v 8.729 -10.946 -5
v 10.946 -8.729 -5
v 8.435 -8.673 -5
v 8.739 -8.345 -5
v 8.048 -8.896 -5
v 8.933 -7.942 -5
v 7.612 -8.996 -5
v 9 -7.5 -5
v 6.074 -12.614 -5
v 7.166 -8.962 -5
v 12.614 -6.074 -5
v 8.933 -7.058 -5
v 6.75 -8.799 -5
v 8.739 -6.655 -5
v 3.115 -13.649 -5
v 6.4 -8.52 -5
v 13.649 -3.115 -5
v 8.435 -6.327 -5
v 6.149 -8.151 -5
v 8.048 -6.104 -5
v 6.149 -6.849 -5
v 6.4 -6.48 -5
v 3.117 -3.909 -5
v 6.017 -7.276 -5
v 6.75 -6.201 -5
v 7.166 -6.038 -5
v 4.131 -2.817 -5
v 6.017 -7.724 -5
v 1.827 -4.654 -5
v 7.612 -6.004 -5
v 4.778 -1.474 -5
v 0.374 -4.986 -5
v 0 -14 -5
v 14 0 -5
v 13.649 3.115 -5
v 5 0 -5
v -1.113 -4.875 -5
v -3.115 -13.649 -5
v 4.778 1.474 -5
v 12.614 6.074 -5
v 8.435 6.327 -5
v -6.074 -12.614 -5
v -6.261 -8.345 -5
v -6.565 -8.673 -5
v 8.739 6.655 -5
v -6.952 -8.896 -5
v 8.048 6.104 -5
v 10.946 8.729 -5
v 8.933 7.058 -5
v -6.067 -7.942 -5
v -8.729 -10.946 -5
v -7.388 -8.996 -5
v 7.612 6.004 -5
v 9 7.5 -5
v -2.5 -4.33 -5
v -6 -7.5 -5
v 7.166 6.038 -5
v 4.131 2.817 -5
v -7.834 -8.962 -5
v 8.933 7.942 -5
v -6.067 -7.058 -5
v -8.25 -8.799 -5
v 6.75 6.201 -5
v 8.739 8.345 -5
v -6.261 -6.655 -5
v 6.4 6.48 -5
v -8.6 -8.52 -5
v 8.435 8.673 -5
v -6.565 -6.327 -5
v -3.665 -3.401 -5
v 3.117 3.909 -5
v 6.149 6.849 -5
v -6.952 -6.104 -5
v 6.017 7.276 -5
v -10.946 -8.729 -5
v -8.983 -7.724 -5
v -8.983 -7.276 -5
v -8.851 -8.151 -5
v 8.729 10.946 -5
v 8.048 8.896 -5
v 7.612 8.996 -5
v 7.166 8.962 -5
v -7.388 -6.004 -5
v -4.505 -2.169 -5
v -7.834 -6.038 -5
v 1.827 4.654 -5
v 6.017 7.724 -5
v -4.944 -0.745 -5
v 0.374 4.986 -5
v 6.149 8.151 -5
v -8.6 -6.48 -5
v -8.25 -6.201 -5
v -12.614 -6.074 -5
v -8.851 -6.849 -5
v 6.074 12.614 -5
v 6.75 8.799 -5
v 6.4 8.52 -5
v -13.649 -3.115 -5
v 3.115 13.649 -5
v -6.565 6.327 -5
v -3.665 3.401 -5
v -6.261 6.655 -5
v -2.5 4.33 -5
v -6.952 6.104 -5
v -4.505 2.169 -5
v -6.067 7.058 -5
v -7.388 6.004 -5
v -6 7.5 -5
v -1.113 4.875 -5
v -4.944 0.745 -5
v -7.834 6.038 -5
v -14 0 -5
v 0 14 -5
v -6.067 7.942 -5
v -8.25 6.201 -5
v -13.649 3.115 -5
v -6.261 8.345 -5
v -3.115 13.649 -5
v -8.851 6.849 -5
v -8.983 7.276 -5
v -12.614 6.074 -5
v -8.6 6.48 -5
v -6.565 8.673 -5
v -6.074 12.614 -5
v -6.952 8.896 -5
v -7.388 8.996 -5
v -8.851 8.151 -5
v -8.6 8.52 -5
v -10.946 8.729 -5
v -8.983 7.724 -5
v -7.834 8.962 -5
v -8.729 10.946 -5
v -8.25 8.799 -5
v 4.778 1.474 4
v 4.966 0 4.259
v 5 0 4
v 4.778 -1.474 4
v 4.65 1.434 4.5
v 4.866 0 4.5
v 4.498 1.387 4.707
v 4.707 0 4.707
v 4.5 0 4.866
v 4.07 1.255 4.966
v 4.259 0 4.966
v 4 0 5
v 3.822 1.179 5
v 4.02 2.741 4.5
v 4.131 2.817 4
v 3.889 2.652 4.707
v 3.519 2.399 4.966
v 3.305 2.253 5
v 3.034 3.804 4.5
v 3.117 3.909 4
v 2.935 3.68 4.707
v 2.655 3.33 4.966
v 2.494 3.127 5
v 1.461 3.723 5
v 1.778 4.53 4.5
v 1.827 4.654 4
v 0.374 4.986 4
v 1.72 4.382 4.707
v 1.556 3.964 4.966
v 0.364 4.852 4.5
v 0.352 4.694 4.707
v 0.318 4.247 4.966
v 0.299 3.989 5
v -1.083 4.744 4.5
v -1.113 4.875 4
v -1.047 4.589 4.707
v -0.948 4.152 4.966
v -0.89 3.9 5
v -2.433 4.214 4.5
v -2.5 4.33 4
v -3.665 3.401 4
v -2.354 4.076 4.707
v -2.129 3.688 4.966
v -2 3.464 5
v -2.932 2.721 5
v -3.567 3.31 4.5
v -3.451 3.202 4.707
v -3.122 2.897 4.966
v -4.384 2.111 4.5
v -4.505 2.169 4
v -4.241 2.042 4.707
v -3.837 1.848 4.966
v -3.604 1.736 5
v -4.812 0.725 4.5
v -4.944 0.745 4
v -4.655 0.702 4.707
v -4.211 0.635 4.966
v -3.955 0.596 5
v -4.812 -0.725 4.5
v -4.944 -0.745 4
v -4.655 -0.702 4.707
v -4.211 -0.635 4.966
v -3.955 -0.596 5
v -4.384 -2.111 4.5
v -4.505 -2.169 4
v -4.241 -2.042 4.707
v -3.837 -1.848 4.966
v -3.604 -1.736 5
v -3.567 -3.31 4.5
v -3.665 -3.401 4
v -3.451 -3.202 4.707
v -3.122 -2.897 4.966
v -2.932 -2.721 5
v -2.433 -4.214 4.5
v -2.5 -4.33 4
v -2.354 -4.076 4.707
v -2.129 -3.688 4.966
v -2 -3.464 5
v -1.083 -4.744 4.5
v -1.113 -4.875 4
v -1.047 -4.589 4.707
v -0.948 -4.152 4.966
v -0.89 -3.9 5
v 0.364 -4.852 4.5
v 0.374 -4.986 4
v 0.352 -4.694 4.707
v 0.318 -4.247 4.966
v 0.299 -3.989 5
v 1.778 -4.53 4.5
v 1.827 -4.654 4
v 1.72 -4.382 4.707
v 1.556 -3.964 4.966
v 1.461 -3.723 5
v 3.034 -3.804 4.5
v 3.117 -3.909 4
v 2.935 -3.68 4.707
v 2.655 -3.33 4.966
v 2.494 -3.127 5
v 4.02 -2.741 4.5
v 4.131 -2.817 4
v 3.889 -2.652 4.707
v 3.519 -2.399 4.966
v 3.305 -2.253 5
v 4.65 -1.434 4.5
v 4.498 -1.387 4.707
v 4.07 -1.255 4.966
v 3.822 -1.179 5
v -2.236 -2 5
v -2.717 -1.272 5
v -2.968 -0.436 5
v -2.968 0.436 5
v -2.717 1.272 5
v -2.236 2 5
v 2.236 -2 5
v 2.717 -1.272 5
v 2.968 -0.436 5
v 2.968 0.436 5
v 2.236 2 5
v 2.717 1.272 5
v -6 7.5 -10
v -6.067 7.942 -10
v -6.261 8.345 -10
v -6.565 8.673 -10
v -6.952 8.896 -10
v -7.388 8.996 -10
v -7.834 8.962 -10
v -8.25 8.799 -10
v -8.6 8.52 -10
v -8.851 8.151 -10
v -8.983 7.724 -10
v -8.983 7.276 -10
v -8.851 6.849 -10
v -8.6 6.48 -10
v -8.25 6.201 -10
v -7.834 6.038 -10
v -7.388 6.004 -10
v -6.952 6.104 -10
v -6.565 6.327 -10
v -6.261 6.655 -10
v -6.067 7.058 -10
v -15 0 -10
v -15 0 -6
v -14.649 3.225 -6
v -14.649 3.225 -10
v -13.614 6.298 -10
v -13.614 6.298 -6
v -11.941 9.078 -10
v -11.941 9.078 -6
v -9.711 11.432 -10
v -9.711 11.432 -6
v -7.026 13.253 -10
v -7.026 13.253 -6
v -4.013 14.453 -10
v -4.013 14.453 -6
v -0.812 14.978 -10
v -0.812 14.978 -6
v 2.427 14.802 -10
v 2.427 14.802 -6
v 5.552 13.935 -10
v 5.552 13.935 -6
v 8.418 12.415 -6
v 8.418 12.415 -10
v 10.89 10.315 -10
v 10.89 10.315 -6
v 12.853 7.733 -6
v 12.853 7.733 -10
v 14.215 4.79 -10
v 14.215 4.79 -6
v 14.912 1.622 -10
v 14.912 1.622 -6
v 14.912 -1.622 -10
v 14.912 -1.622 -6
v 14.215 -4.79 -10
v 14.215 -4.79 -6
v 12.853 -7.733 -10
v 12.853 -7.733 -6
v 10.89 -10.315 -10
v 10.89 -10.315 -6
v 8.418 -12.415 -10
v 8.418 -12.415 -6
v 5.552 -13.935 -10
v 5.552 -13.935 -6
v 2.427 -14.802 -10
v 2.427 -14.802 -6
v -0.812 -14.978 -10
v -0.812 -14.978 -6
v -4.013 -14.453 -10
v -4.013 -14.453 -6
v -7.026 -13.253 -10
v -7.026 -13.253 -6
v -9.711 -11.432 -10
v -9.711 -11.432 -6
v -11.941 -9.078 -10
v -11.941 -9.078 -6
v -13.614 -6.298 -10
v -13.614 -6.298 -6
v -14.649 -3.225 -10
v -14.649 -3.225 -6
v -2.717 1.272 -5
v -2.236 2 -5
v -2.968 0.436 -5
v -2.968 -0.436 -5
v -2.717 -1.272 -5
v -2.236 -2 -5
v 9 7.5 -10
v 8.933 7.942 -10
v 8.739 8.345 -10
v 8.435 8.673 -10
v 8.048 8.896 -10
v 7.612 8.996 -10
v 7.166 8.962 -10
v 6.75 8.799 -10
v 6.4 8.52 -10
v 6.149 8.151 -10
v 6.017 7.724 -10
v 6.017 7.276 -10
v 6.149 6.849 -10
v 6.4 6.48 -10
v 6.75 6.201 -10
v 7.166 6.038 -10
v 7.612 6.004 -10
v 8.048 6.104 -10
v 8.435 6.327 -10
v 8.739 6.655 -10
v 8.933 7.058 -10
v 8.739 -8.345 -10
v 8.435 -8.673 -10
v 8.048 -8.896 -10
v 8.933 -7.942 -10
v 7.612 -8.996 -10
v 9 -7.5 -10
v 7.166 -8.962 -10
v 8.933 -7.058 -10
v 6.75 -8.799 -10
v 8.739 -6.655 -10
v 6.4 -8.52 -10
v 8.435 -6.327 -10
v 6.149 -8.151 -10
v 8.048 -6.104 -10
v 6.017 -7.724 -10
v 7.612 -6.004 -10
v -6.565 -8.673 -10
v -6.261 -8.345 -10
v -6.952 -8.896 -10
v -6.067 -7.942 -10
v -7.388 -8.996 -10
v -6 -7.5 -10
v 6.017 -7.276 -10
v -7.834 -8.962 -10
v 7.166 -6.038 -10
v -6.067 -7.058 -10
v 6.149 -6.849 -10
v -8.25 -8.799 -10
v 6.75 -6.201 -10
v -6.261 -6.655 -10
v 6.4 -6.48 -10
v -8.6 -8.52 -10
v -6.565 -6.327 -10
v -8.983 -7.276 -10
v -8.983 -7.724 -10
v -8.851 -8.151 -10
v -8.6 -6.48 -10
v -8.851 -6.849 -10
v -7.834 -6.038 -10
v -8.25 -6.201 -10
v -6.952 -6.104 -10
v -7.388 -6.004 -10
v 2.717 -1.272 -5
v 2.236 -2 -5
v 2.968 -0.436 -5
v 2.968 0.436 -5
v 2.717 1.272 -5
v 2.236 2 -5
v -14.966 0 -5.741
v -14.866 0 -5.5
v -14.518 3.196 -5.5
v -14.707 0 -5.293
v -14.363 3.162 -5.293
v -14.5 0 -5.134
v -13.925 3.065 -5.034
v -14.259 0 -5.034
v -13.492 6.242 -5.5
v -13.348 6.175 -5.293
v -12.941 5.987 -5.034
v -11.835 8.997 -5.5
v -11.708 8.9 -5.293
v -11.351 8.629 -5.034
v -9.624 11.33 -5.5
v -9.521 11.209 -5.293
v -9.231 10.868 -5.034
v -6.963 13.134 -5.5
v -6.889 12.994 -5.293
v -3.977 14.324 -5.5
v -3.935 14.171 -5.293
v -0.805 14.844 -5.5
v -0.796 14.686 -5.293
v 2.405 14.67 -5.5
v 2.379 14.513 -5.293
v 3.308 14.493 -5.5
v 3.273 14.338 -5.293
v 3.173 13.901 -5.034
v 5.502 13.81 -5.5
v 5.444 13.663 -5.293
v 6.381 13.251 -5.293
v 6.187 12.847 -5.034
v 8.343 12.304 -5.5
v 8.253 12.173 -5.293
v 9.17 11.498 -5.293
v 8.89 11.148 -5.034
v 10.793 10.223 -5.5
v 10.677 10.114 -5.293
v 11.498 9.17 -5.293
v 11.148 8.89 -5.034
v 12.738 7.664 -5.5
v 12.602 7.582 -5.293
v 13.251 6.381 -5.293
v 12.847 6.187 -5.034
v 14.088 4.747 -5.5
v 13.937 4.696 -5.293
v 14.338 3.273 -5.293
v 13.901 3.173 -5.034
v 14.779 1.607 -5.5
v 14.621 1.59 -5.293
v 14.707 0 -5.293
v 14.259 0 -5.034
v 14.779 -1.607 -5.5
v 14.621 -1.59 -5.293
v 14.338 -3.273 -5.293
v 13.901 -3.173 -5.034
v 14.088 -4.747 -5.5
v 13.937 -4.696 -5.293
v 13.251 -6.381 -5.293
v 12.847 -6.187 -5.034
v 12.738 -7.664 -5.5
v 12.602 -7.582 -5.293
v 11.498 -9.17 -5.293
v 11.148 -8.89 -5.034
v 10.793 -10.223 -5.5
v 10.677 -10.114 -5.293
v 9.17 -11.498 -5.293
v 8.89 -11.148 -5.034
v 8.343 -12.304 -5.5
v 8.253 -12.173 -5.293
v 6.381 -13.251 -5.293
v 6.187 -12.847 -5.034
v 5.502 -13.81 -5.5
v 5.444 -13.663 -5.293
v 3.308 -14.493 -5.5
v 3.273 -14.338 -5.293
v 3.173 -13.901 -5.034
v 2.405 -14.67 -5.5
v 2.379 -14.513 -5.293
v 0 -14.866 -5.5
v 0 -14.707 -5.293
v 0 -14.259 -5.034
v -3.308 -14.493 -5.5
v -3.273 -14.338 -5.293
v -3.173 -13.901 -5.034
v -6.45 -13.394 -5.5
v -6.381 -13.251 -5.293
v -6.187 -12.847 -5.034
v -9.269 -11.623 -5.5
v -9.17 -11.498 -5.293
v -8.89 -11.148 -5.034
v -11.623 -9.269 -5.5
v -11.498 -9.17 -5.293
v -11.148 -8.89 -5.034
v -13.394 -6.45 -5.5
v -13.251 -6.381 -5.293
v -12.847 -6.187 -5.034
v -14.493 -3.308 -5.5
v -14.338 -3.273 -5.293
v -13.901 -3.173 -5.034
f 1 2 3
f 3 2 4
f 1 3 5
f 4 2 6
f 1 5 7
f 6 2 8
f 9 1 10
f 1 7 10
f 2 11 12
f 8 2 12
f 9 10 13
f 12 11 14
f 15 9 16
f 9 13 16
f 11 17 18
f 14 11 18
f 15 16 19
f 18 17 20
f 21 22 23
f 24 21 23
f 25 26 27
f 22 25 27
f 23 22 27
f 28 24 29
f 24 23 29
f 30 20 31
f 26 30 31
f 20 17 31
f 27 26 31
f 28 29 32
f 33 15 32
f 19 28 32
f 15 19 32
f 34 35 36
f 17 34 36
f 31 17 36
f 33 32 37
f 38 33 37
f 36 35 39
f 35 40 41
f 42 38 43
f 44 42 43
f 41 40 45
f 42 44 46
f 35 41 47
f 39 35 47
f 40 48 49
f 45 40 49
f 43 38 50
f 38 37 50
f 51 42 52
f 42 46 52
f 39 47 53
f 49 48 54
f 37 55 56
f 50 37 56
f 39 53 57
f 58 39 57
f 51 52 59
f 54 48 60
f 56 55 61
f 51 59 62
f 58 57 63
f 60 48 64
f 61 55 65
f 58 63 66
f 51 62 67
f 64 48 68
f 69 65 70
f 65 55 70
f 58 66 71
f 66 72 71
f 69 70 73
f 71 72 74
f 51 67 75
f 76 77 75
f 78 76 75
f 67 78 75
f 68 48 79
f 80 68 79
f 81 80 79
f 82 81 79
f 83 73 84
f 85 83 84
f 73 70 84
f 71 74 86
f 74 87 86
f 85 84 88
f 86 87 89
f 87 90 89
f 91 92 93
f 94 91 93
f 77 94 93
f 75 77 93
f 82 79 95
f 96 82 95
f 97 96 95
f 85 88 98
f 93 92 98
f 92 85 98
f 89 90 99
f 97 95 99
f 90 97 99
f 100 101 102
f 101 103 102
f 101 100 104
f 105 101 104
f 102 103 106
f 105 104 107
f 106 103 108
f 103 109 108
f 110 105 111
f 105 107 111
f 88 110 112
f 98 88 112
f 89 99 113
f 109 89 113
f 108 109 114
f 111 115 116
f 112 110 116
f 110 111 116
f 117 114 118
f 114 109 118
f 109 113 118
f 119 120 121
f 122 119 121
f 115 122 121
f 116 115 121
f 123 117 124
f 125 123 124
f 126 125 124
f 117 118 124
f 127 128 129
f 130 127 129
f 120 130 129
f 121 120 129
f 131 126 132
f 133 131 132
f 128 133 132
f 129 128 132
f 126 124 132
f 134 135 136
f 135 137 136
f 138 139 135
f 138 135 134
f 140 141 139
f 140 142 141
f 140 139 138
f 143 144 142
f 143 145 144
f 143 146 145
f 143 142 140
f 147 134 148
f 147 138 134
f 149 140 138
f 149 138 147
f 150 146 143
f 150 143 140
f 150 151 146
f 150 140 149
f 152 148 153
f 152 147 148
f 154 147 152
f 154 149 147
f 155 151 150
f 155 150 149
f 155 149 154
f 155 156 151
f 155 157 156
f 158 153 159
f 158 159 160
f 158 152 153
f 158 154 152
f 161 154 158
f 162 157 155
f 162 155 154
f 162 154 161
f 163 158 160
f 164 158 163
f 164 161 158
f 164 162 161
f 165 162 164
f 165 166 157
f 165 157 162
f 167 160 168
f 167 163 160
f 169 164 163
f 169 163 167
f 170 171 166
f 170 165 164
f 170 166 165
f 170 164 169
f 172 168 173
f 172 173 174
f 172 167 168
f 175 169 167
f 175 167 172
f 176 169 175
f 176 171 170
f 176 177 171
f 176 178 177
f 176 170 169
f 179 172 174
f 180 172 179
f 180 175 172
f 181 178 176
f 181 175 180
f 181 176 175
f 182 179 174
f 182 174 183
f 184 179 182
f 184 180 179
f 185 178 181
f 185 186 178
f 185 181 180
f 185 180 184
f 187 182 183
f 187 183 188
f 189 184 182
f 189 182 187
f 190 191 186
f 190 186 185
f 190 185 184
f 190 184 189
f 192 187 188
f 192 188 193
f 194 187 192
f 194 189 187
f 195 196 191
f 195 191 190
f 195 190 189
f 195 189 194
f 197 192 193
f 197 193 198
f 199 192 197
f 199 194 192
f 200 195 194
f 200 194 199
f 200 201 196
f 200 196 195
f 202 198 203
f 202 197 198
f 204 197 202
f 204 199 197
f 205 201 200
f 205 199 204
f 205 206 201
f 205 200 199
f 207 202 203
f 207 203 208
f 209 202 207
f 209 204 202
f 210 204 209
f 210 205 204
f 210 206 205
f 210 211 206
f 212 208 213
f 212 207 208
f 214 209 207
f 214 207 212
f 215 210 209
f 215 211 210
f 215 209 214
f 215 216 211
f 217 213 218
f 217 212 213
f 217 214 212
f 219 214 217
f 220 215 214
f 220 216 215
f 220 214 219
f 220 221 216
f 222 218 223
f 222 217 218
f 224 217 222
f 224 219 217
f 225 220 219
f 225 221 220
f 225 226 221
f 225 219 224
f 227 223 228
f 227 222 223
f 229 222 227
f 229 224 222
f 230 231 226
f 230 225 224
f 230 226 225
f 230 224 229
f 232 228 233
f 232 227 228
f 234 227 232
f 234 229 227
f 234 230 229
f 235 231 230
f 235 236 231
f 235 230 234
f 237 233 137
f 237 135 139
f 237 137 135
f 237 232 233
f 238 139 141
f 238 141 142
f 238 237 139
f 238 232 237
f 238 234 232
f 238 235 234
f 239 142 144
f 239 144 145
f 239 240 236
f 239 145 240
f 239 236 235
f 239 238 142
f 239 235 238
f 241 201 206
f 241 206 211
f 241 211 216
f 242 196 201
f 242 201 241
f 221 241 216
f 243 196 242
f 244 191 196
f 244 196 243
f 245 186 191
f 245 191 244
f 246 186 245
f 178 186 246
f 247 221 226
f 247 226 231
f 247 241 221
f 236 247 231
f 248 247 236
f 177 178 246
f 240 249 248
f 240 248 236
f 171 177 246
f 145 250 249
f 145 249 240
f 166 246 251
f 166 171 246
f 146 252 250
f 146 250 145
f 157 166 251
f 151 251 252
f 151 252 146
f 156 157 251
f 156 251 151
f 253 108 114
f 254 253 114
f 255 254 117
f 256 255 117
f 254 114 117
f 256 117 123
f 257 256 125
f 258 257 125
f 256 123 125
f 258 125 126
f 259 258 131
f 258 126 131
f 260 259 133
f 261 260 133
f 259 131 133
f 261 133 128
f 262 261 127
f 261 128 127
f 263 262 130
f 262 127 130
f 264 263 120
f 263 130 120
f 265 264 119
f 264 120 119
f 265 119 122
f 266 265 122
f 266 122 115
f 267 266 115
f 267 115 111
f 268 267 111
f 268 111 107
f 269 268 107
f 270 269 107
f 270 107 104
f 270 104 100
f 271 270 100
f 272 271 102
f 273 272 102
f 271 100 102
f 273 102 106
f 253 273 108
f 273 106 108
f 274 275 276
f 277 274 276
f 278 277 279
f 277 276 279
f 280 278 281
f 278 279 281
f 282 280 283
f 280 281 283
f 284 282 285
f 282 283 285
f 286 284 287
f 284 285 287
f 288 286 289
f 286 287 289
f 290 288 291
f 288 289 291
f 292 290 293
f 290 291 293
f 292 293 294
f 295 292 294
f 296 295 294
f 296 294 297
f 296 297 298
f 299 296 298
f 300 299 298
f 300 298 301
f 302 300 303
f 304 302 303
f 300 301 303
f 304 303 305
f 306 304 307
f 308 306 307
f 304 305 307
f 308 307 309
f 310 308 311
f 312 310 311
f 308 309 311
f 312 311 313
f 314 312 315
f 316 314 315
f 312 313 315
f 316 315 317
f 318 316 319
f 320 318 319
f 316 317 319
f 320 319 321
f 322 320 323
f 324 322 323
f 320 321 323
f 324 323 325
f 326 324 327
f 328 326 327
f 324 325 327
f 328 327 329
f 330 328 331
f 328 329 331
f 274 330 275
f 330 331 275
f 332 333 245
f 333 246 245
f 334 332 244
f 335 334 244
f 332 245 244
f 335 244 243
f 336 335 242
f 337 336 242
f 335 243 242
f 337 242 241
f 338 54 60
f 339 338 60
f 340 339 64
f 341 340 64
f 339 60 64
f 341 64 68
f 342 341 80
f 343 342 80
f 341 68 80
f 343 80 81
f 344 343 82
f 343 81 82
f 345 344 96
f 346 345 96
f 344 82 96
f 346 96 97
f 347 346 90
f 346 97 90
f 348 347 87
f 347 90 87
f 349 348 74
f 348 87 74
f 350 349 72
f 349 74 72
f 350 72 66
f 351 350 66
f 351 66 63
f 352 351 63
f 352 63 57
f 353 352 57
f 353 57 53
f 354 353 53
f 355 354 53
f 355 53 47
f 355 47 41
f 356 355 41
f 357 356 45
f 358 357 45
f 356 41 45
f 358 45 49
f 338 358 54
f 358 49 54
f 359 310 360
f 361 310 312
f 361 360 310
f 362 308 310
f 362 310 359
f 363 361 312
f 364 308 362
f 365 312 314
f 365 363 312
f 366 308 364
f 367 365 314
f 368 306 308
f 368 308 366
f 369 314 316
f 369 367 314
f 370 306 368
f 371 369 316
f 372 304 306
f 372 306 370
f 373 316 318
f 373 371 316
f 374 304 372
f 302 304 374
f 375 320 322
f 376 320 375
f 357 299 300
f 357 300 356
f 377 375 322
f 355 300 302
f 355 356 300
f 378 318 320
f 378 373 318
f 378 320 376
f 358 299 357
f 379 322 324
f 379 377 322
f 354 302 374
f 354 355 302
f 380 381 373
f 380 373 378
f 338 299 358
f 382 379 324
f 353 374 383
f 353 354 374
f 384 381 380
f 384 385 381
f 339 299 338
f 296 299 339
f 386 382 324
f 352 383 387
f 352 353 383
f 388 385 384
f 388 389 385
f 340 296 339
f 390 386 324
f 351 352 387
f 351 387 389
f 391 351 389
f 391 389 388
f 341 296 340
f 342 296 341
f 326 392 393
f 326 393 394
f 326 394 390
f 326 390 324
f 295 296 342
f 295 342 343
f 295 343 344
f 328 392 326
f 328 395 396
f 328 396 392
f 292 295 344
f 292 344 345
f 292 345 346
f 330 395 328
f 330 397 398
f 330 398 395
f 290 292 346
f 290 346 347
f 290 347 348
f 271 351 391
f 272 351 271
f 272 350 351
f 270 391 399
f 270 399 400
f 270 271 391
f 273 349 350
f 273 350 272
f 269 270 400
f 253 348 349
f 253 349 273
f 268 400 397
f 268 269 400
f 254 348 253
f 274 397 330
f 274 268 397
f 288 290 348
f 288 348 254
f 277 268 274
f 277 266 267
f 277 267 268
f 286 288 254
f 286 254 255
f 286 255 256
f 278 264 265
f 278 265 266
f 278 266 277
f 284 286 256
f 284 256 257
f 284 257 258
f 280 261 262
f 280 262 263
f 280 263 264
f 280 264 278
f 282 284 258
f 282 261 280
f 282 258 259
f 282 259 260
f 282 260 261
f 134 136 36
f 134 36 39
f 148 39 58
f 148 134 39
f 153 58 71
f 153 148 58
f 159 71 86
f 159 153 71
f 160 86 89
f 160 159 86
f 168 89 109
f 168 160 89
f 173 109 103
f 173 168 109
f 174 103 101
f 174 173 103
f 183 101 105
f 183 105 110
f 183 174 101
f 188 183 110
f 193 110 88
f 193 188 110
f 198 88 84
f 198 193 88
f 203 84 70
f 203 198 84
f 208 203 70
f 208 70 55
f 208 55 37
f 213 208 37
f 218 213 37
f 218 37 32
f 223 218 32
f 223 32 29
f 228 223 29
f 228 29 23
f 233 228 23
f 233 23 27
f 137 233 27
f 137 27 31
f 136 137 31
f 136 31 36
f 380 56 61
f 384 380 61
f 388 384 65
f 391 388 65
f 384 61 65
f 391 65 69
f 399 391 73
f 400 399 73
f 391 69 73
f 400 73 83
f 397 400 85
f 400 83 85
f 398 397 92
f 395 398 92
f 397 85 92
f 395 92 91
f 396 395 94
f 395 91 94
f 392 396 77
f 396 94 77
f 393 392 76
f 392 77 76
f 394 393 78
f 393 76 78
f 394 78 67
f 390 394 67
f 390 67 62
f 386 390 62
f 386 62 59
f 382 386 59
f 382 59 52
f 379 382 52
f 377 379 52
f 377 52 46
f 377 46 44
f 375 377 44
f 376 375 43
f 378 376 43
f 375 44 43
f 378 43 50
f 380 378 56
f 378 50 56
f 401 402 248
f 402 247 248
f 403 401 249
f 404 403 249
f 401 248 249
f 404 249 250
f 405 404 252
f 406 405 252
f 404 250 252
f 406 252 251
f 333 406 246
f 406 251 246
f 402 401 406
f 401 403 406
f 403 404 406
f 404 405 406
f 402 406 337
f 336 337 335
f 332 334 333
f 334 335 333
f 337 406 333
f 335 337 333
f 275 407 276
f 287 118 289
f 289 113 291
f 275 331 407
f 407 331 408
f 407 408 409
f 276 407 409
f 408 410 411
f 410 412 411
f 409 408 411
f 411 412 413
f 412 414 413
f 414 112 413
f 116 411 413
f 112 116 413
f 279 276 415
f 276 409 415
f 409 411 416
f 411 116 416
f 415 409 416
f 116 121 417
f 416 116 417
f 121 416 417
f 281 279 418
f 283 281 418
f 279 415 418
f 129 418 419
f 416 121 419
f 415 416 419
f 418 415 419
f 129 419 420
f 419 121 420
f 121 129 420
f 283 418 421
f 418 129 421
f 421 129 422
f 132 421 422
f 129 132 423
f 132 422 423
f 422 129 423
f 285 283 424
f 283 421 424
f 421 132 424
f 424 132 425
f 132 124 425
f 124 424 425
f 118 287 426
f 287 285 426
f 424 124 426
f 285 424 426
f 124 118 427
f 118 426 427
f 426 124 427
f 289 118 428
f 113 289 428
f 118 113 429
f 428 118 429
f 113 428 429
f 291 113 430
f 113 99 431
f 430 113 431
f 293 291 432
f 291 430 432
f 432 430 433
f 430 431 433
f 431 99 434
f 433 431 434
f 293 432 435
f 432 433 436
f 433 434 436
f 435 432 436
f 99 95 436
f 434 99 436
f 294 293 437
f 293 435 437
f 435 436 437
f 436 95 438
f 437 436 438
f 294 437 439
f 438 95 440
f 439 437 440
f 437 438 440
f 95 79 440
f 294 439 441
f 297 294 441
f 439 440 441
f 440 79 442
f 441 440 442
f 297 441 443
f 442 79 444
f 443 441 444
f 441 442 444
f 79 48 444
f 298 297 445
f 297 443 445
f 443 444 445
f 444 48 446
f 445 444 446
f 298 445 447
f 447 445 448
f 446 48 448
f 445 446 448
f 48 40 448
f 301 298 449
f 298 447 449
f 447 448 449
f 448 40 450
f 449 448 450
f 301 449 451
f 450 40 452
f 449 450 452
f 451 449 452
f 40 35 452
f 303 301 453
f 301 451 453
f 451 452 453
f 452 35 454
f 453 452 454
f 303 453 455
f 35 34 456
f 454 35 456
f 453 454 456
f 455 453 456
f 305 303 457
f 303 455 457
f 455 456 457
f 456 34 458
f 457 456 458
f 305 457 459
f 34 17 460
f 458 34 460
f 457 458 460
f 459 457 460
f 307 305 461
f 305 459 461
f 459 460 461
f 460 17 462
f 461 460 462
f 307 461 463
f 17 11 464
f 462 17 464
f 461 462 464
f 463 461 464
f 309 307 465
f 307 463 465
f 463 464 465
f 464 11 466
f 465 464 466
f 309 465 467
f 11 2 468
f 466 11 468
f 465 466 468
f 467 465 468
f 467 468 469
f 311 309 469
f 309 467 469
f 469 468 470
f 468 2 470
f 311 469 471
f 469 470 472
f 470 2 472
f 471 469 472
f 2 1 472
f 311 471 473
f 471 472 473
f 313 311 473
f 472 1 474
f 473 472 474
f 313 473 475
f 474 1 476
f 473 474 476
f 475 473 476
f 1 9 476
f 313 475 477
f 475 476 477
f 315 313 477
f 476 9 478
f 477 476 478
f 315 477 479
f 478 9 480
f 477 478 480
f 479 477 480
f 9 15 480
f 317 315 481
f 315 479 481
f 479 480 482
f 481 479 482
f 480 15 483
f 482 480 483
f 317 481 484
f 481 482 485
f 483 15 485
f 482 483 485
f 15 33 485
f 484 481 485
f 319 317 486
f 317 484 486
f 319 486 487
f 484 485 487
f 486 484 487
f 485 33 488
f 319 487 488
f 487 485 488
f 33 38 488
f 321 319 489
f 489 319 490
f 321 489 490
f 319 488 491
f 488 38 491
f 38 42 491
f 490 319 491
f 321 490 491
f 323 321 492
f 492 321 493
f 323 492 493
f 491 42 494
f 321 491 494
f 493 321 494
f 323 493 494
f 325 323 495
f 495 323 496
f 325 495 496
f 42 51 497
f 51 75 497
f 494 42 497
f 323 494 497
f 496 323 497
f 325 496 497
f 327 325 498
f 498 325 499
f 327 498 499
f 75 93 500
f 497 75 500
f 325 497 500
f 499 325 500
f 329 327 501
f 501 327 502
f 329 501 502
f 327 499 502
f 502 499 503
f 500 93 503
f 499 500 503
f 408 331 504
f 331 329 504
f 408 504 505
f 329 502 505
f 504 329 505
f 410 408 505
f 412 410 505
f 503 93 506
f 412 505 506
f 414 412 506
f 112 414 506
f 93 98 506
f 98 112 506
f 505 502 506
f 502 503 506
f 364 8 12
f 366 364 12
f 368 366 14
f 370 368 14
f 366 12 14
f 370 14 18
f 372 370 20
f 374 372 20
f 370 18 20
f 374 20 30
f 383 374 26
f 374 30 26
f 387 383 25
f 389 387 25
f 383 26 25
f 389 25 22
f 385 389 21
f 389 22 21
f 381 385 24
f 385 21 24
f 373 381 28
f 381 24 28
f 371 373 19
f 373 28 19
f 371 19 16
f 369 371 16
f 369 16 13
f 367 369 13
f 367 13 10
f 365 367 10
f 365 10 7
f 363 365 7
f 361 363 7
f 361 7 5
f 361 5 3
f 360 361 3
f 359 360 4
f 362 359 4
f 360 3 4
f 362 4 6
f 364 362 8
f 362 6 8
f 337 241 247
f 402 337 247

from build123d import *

# Parameters (mm, degrees)
CROQUIS1_R              = 5
SALIENTE_EXTRUIR1_DEPTH = 5
CROQUIS2_R              = 15
SALIENTE_EXTRUIR2_DEPTH = 5
CROQUIS3_R              = 1.5
CORTAR_EXTRUIR1_DEPTH   = 5
REDONDEO1_R             = 1
REDONDEO2_R             = 1


with BuildPart() as part:
    # Croquis1 → Saliente-Extruir1 (new, symmetric)
    with BuildSketch(Plane.XY):
        Circle(CROQUIS1_R)
        with BuildLine():
            Line((-2.236067977, -2), (2.236067977, -2))
            ThreePointArc((2.236067977, -2), (3, 0), (2.236067977, 2))
            Line((2.236067977, 2), (-2.236067977, 2))
            ThreePointArc((-2.236067977, 2), (-3, 0), (-2.236067977, -2))
        make_face(mode=Mode.SUBTRACT)
    extrude(amount=SALIENTE_EXTRUIR1_DEPTH, both=True)

    # Croquis2 → Saliente-Extruir2 (add)
    with BuildSketch(Plane(origin=(0, 0, -5), x_dir=(-1, 0, 0), z_dir=(0, 0, -1))):
        Circle(CROQUIS2_R)
    extrude(amount=SALIENTE_EXTRUIR2_DEPTH)

    # Croquis3 → Cortar-Extruir1 (cut)
    with BuildSketch(Plane.XY.offset(-5)):
        with Locations((-7.5, 7.5)):
            Circle(CROQUIS3_R)
        with Locations((7.5, 7.5)):
            Circle(CROQUIS3_R)
        with Locations((-7.5, -7.5)):
            Circle(CROQUIS3_R)
        with Locations((7.5, -7.5)):
            Circle(CROQUIS3_R)
    extrude(amount=-CORTAR_EXTRUIR1_DEPTH, mode=Mode.SUBTRACT)

    # Redondeo1
    redondeo1_edges = [part.edges().sort_by_distance(p)[0] for p in [
        (15, 0, -5),
    ]]
    fillet(redondeo1_edges, radius=REDONDEO1_R)

    # Redondeo2
    redondeo2_edges = [part.edges().sort_by_distance(p)[0] for p in [
        (-5, 0, 5),
    ]]
    fillet(redondeo2_edges, radius=REDONDEO2_R)


solid = part.part
